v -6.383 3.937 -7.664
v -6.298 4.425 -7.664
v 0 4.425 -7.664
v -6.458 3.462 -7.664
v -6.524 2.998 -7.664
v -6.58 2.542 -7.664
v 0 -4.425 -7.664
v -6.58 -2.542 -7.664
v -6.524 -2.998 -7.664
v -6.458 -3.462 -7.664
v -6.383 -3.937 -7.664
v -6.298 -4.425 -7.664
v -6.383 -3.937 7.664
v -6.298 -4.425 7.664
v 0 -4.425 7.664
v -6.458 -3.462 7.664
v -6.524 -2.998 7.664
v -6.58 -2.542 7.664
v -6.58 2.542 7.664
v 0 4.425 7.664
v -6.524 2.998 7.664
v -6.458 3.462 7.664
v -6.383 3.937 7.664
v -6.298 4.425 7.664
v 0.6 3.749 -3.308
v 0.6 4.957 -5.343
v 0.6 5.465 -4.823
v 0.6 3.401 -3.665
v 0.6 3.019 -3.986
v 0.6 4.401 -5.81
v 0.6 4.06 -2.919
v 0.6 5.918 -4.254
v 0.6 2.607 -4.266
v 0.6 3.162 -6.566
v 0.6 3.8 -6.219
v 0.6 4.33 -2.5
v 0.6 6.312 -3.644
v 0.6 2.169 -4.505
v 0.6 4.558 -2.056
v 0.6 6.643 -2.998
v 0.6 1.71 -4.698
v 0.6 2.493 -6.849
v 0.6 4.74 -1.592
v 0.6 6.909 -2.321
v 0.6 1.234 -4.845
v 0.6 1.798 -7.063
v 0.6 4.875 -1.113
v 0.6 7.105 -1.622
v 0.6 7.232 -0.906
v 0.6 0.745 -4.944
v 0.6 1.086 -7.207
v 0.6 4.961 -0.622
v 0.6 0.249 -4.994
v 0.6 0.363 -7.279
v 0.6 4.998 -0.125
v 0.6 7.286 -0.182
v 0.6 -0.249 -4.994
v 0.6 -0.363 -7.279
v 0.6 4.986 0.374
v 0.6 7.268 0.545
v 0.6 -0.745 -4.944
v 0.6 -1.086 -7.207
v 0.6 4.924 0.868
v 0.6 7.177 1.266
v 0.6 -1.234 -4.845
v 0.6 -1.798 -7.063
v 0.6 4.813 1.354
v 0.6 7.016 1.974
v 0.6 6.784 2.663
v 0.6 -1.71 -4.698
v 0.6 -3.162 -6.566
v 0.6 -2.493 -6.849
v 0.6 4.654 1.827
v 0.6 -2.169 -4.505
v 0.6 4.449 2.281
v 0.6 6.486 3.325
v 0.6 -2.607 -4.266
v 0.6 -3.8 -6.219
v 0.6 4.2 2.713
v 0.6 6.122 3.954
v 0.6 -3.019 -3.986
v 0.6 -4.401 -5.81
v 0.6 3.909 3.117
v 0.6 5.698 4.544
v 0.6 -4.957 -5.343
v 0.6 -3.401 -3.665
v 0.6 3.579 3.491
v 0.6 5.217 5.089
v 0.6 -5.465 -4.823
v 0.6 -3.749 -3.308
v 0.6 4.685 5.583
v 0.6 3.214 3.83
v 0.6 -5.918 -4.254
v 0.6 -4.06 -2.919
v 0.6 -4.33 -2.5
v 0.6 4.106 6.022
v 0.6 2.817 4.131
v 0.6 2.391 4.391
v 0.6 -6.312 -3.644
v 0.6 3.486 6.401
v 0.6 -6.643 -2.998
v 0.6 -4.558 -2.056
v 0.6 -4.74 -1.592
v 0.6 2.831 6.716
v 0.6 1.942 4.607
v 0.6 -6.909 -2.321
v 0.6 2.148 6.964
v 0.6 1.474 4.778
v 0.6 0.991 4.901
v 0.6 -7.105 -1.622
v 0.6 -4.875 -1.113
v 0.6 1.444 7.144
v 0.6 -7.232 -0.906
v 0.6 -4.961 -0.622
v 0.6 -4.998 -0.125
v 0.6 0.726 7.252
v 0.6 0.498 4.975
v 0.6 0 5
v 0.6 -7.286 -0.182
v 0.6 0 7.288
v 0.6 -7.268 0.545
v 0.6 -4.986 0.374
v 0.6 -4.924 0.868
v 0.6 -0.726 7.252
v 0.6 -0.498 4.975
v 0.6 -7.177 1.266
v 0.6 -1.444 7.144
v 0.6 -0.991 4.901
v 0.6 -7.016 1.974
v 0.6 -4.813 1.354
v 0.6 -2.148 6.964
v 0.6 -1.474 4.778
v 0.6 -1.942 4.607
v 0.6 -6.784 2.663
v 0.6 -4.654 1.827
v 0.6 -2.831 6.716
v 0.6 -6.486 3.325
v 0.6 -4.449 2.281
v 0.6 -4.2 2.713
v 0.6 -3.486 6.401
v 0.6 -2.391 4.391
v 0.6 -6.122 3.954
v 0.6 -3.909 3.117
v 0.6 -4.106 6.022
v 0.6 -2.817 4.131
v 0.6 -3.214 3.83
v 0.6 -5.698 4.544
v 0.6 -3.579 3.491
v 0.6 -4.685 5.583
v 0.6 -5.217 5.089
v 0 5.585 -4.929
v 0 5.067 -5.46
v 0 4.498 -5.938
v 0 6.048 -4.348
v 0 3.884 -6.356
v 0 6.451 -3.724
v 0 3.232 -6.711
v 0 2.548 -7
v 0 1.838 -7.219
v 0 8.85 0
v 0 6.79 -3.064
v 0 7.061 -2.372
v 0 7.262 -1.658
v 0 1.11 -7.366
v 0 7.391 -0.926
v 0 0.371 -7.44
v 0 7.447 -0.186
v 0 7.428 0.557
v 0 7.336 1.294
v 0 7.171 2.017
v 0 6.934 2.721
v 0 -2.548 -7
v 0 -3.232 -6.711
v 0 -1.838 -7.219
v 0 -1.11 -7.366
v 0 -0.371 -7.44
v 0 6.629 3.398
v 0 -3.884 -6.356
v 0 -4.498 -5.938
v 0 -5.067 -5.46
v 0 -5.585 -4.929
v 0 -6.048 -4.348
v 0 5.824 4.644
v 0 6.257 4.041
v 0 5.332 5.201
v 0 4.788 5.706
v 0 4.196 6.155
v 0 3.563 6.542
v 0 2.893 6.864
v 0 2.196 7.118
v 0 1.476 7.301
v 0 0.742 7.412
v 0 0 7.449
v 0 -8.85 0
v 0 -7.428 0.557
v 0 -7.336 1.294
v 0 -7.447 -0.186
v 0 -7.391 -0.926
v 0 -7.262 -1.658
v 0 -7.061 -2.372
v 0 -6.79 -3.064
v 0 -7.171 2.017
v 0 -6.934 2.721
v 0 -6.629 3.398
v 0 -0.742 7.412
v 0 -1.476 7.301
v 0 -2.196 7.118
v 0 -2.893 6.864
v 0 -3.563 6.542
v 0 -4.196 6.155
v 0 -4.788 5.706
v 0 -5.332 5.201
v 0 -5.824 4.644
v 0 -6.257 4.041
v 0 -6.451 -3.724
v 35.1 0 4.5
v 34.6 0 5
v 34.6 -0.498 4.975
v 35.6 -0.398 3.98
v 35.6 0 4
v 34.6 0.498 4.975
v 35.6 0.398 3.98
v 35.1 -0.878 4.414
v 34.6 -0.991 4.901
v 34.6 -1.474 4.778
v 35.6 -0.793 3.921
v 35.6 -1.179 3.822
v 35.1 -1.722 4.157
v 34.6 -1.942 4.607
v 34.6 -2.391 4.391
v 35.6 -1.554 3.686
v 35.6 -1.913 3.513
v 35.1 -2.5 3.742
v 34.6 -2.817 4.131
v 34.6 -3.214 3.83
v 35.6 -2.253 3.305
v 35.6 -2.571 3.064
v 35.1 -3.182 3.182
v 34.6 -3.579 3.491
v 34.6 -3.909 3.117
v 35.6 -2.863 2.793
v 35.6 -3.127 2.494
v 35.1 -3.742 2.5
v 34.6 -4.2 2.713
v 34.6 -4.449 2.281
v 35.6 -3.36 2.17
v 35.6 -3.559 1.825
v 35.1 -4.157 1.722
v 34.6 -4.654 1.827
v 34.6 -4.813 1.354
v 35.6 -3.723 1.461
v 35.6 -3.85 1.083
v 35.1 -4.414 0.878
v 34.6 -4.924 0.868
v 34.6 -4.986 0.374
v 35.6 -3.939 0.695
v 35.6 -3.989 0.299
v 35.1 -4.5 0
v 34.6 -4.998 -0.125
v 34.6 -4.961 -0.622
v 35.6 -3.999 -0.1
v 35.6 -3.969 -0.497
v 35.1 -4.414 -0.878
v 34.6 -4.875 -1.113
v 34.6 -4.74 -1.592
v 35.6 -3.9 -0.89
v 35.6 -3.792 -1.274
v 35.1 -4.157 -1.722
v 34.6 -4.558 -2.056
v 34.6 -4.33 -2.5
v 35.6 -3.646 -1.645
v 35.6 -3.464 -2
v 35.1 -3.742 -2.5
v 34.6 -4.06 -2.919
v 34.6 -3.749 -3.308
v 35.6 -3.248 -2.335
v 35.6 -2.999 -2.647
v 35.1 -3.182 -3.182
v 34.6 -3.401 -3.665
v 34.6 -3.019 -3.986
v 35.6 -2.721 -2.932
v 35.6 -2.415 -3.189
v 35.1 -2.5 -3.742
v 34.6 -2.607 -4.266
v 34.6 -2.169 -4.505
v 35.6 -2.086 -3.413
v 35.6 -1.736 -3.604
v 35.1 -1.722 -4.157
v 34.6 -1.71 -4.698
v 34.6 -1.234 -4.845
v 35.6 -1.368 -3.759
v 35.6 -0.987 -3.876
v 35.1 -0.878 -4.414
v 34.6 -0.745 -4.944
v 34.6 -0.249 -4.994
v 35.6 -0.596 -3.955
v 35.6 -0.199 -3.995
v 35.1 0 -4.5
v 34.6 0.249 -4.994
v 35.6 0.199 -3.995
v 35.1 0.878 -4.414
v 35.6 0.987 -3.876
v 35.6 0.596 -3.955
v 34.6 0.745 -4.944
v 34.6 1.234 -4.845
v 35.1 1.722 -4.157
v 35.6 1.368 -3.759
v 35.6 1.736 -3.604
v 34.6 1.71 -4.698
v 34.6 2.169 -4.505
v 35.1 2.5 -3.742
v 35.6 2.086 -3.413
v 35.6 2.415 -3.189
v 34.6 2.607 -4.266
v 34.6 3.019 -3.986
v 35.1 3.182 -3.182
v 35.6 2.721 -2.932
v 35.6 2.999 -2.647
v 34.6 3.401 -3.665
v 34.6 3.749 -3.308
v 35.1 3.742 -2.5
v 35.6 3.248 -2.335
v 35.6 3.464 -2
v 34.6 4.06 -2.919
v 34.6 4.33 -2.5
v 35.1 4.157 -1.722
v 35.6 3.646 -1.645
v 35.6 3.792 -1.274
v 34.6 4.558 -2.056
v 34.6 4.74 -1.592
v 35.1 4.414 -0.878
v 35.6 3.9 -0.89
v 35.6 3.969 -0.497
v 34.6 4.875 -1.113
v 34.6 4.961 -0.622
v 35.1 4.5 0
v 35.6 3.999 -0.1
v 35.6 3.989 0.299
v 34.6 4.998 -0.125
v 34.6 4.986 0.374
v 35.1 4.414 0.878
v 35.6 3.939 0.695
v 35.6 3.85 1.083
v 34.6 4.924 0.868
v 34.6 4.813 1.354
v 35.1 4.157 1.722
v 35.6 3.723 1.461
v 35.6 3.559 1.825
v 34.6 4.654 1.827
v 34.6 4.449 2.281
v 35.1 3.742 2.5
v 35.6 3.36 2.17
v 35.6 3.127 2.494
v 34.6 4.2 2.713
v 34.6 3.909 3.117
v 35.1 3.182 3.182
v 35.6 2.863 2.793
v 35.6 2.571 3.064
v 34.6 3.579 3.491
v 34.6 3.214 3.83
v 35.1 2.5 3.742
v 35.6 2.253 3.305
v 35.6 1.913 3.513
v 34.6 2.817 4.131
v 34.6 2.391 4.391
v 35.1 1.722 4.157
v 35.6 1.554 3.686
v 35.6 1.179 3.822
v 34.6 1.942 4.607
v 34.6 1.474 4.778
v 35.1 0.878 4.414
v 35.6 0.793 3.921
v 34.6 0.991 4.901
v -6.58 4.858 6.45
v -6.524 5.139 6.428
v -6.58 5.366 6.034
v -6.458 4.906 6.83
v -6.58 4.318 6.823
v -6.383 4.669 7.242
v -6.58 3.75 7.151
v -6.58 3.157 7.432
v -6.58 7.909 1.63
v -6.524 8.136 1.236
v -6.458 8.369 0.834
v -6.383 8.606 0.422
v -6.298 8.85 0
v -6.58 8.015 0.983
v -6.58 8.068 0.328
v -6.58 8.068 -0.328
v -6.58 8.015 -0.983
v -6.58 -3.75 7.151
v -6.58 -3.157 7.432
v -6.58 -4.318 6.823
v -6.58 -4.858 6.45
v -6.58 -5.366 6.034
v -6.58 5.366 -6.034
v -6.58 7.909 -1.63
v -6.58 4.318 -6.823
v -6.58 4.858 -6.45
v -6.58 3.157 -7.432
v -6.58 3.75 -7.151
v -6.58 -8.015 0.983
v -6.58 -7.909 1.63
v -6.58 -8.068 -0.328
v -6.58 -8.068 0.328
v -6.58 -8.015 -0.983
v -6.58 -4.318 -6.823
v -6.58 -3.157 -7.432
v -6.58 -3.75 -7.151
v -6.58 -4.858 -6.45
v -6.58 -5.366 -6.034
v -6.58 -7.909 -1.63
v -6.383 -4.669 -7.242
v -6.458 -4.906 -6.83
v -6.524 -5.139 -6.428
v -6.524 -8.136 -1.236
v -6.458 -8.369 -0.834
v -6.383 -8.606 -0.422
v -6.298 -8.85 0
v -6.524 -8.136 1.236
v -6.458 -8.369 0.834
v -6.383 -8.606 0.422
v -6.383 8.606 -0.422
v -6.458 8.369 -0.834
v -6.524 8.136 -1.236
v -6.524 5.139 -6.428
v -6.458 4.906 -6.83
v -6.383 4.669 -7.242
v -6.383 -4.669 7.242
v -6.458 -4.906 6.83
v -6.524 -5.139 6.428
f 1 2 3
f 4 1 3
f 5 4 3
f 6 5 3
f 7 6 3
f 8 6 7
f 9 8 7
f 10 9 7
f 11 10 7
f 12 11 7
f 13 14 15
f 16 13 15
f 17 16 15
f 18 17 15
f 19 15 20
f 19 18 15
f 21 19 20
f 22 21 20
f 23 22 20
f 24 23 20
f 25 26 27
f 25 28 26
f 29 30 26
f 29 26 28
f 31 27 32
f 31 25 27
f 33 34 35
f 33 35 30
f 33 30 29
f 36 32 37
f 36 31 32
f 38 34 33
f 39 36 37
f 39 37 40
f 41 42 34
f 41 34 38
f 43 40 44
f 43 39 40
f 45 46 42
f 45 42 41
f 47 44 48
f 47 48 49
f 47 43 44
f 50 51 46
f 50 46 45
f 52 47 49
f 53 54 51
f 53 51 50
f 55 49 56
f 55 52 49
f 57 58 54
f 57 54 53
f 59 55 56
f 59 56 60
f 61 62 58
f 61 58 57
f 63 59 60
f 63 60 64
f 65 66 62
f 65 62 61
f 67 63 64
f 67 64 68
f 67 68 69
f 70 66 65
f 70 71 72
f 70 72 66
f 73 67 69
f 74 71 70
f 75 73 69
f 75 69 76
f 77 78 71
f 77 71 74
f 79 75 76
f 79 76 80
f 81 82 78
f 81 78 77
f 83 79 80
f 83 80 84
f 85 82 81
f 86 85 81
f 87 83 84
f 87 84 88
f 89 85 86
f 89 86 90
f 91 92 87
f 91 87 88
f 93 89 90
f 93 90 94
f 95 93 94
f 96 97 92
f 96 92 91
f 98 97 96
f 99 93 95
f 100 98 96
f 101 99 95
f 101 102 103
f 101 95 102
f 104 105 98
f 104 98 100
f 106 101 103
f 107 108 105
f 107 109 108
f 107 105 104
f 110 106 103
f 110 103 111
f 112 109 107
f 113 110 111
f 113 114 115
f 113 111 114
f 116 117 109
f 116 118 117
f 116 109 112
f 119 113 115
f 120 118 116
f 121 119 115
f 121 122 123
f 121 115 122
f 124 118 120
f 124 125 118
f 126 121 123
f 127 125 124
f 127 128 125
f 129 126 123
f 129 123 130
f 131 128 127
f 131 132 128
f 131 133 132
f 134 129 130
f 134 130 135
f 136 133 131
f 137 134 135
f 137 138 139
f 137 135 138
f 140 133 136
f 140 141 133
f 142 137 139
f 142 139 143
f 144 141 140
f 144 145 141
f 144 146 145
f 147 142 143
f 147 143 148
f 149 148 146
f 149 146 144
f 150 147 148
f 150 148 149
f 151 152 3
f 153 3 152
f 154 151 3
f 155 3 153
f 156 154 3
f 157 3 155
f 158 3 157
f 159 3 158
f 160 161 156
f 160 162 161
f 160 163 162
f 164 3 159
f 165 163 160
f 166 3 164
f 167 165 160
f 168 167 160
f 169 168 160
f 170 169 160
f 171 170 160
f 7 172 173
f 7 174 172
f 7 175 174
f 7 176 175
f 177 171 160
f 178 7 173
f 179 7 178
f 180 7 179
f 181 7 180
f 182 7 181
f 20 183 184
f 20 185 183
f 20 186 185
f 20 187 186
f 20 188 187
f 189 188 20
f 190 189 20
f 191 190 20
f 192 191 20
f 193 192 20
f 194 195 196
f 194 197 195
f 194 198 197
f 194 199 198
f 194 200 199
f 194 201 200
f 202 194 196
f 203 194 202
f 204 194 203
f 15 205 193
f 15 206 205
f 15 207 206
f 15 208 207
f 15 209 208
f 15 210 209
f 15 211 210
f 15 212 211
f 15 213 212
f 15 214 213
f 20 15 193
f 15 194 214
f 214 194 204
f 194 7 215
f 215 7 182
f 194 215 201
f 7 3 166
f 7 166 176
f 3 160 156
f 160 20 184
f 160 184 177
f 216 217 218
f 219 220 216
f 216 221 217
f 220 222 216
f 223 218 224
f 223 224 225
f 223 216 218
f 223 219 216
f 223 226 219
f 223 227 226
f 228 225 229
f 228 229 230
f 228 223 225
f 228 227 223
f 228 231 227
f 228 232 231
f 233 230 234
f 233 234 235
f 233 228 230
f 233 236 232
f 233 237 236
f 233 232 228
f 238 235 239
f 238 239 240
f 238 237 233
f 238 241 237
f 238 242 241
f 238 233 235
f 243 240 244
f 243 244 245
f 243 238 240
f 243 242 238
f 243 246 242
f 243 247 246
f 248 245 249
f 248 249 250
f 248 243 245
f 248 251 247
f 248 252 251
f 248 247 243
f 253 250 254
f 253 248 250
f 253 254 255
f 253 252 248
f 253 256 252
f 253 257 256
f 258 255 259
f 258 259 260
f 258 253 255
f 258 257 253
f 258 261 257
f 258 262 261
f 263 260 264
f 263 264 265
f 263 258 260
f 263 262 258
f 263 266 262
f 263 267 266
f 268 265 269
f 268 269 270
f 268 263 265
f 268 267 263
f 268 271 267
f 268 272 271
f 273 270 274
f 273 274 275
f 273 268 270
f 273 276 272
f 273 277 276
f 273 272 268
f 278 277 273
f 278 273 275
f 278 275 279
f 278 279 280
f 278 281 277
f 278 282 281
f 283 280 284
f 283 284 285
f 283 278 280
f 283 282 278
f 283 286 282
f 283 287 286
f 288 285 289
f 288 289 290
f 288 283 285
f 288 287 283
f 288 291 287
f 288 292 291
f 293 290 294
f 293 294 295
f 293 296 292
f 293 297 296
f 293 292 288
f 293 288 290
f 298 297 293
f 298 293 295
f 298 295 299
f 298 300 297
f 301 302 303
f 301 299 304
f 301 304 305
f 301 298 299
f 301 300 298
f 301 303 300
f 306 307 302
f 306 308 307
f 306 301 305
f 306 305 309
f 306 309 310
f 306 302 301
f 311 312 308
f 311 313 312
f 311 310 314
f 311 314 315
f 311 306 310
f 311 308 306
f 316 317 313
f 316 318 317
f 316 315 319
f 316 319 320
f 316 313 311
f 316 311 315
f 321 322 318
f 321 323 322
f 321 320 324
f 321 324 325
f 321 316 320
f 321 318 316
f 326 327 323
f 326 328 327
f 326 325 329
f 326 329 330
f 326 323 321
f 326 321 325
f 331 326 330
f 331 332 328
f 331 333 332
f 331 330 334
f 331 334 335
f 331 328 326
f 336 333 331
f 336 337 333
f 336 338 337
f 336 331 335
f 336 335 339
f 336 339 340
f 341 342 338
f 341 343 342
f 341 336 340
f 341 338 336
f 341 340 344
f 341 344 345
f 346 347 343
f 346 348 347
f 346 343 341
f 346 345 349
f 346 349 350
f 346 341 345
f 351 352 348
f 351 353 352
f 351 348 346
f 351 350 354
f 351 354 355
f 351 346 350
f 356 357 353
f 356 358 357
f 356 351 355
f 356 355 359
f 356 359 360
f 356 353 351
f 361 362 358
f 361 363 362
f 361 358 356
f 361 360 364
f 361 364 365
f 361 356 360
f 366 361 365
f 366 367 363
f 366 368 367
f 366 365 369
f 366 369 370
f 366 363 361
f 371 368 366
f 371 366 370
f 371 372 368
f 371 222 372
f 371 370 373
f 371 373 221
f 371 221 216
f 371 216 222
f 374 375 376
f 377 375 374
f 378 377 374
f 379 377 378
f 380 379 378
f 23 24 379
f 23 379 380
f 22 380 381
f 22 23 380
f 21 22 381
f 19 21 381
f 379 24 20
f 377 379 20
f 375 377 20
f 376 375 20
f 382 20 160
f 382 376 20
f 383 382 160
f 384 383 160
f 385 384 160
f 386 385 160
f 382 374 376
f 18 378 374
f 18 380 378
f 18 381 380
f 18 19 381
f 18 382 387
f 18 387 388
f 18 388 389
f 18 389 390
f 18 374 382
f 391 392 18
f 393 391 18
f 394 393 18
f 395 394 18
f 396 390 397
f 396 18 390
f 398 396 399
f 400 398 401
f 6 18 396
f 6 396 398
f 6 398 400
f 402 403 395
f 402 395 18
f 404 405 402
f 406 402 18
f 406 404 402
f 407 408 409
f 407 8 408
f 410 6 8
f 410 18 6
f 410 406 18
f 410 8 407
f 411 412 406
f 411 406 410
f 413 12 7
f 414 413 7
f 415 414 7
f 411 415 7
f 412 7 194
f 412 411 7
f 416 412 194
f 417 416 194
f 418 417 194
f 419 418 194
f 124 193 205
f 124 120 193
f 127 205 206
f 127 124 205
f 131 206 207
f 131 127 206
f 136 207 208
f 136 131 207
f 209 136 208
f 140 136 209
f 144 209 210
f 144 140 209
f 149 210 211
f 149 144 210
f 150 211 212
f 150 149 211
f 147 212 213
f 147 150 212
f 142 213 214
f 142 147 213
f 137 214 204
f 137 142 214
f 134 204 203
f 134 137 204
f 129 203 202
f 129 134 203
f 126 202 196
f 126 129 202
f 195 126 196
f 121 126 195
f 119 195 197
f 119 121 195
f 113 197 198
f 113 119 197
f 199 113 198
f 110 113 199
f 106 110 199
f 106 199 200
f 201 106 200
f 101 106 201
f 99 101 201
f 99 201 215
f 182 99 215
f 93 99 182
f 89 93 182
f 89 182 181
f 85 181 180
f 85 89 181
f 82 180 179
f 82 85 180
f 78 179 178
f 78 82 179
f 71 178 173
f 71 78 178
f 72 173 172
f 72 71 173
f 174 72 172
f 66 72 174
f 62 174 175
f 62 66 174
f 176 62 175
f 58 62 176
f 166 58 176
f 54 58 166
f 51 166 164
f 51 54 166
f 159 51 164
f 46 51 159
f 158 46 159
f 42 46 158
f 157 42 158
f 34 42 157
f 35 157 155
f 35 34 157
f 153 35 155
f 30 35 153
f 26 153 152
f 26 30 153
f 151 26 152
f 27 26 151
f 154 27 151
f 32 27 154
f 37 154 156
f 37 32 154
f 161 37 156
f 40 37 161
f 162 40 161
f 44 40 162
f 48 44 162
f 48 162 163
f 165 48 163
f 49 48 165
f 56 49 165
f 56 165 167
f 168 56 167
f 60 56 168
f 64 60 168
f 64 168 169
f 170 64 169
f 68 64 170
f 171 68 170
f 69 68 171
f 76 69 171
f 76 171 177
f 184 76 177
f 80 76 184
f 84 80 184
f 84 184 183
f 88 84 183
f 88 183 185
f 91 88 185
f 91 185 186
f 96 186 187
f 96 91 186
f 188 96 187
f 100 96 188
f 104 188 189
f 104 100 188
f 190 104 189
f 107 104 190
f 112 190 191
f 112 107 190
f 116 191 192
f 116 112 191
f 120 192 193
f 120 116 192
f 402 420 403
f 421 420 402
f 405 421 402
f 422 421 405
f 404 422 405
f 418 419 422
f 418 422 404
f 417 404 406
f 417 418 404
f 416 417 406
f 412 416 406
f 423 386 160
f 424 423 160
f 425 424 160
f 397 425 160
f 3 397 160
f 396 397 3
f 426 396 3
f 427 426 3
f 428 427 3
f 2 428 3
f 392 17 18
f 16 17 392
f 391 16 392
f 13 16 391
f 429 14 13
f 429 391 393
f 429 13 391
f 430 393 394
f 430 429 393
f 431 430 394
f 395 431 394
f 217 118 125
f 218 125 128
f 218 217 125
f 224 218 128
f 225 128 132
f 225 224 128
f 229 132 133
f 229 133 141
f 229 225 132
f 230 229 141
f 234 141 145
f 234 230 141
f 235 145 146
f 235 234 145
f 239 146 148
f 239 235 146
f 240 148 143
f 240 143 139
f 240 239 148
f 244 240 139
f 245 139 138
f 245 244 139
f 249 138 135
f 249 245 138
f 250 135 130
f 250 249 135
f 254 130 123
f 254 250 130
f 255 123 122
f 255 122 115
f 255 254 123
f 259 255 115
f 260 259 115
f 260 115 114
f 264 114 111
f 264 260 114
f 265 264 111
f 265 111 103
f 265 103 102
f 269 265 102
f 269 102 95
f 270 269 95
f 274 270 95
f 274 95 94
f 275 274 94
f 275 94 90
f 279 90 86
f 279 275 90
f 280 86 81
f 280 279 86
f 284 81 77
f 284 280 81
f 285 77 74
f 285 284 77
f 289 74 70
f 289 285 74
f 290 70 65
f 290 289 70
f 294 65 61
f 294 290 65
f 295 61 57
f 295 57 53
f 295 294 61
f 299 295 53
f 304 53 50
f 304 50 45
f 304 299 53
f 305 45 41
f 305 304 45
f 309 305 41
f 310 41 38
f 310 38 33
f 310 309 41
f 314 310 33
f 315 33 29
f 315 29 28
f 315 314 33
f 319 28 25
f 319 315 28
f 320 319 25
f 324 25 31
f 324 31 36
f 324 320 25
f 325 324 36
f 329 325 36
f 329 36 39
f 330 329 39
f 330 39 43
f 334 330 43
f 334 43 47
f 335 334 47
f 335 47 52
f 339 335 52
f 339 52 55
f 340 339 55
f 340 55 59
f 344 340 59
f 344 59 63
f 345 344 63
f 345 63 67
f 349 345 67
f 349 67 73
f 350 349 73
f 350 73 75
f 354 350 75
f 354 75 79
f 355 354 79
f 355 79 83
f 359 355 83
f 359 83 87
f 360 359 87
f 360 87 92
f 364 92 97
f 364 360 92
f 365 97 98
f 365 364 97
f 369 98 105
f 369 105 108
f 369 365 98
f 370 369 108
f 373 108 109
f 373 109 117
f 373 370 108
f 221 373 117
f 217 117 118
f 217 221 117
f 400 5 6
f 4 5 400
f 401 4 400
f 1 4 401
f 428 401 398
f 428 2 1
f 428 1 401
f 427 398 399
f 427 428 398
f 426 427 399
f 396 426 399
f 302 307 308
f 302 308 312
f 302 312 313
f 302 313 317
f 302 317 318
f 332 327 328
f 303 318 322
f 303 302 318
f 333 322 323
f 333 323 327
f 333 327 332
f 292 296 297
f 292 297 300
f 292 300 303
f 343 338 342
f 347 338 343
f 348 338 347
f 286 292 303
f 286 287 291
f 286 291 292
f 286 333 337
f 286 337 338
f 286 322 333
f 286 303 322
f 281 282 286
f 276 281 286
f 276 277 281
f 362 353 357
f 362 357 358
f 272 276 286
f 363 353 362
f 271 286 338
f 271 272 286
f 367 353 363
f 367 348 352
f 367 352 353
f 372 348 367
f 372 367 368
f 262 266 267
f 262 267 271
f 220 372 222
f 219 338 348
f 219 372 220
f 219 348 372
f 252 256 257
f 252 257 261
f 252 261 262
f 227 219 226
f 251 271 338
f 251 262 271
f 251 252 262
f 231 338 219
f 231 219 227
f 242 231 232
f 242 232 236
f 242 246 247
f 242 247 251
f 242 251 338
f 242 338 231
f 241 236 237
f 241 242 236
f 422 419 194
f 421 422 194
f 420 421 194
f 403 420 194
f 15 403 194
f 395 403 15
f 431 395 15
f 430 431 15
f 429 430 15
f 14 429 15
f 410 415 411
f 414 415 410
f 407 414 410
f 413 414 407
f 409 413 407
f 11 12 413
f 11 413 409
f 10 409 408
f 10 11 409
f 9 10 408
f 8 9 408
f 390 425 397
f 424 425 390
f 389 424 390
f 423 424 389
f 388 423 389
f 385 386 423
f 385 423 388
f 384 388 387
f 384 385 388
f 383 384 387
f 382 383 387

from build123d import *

# Parameters (mm, degrees)
SKETCH_2_OUTSIDE_W  = 29.51
SKETCH_2_OUTSIDE_H  = 29.51
CUT_EXTRUDE_1_DEPTH = 44.997697667
CHAMFER_1_SIZE      = 1


with BuildPart() as part:
    # Эскиз1 → Повернуть1 (revolve)
    with BuildSketch(Plane.XY, mode=Mode.PRIVATE) as revolve_1_sk:
        Polygon((-6.58, 0), (-6.58, 8.85), (0, 8.85), (0, 7.448974596), (0.6, 7.288205081), (0.6, 5), (35.6, 5), (35.6, 0), align=None)
    revolve(revolve_1_sk.sketch.rotate(Axis((-1000, 0, 0), (1, 0, 0)), 90), axis=Axis((-1000, 0, 0), (1, 0, 0)))

    # Эскиз2 outside → Вырез-Вытянуть1 (cut, through all)
    with BuildSketch(Plane.ZY.offset(6.58)):
        Rectangle(SKETCH_2_OUTSIDE_W, SKETCH_2_OUTSIDE_H)
        Polygon((0, -8.85), (7.664324823, -4.425), (7.664324823, 4.425), (0, 8.85), (-7.664324823, 4.425), (-7.664324823, -4.425), align=None, mode=Mode.SUBTRACT)
    extrude(amount=-CUT_EXTRUDE_1_DEPTH, mode=Mode.SUBTRACT)

    # Эскиз4 → Вырез-Повернуть1 (revolve, cut)
    with BuildSketch(Plane.XY):
        Polygon((-6.58, 8.075), (-6.297923068, 8.85), (-6.58, 8.85), align=None)
    revolve(axis=Axis((-1000, 0, 0), (1, 0, 0)), mode=Mode.SUBTRACT)

    # Фаска1
    chamfer_1_edges = [part.edges().sort_by_distance(p)[0] for p in [
        (35.6, 0, -5),
    ]]
    chamfer(chamfer_1_edges, length=CHAMFER_1_SIZE)


solid = part.part
